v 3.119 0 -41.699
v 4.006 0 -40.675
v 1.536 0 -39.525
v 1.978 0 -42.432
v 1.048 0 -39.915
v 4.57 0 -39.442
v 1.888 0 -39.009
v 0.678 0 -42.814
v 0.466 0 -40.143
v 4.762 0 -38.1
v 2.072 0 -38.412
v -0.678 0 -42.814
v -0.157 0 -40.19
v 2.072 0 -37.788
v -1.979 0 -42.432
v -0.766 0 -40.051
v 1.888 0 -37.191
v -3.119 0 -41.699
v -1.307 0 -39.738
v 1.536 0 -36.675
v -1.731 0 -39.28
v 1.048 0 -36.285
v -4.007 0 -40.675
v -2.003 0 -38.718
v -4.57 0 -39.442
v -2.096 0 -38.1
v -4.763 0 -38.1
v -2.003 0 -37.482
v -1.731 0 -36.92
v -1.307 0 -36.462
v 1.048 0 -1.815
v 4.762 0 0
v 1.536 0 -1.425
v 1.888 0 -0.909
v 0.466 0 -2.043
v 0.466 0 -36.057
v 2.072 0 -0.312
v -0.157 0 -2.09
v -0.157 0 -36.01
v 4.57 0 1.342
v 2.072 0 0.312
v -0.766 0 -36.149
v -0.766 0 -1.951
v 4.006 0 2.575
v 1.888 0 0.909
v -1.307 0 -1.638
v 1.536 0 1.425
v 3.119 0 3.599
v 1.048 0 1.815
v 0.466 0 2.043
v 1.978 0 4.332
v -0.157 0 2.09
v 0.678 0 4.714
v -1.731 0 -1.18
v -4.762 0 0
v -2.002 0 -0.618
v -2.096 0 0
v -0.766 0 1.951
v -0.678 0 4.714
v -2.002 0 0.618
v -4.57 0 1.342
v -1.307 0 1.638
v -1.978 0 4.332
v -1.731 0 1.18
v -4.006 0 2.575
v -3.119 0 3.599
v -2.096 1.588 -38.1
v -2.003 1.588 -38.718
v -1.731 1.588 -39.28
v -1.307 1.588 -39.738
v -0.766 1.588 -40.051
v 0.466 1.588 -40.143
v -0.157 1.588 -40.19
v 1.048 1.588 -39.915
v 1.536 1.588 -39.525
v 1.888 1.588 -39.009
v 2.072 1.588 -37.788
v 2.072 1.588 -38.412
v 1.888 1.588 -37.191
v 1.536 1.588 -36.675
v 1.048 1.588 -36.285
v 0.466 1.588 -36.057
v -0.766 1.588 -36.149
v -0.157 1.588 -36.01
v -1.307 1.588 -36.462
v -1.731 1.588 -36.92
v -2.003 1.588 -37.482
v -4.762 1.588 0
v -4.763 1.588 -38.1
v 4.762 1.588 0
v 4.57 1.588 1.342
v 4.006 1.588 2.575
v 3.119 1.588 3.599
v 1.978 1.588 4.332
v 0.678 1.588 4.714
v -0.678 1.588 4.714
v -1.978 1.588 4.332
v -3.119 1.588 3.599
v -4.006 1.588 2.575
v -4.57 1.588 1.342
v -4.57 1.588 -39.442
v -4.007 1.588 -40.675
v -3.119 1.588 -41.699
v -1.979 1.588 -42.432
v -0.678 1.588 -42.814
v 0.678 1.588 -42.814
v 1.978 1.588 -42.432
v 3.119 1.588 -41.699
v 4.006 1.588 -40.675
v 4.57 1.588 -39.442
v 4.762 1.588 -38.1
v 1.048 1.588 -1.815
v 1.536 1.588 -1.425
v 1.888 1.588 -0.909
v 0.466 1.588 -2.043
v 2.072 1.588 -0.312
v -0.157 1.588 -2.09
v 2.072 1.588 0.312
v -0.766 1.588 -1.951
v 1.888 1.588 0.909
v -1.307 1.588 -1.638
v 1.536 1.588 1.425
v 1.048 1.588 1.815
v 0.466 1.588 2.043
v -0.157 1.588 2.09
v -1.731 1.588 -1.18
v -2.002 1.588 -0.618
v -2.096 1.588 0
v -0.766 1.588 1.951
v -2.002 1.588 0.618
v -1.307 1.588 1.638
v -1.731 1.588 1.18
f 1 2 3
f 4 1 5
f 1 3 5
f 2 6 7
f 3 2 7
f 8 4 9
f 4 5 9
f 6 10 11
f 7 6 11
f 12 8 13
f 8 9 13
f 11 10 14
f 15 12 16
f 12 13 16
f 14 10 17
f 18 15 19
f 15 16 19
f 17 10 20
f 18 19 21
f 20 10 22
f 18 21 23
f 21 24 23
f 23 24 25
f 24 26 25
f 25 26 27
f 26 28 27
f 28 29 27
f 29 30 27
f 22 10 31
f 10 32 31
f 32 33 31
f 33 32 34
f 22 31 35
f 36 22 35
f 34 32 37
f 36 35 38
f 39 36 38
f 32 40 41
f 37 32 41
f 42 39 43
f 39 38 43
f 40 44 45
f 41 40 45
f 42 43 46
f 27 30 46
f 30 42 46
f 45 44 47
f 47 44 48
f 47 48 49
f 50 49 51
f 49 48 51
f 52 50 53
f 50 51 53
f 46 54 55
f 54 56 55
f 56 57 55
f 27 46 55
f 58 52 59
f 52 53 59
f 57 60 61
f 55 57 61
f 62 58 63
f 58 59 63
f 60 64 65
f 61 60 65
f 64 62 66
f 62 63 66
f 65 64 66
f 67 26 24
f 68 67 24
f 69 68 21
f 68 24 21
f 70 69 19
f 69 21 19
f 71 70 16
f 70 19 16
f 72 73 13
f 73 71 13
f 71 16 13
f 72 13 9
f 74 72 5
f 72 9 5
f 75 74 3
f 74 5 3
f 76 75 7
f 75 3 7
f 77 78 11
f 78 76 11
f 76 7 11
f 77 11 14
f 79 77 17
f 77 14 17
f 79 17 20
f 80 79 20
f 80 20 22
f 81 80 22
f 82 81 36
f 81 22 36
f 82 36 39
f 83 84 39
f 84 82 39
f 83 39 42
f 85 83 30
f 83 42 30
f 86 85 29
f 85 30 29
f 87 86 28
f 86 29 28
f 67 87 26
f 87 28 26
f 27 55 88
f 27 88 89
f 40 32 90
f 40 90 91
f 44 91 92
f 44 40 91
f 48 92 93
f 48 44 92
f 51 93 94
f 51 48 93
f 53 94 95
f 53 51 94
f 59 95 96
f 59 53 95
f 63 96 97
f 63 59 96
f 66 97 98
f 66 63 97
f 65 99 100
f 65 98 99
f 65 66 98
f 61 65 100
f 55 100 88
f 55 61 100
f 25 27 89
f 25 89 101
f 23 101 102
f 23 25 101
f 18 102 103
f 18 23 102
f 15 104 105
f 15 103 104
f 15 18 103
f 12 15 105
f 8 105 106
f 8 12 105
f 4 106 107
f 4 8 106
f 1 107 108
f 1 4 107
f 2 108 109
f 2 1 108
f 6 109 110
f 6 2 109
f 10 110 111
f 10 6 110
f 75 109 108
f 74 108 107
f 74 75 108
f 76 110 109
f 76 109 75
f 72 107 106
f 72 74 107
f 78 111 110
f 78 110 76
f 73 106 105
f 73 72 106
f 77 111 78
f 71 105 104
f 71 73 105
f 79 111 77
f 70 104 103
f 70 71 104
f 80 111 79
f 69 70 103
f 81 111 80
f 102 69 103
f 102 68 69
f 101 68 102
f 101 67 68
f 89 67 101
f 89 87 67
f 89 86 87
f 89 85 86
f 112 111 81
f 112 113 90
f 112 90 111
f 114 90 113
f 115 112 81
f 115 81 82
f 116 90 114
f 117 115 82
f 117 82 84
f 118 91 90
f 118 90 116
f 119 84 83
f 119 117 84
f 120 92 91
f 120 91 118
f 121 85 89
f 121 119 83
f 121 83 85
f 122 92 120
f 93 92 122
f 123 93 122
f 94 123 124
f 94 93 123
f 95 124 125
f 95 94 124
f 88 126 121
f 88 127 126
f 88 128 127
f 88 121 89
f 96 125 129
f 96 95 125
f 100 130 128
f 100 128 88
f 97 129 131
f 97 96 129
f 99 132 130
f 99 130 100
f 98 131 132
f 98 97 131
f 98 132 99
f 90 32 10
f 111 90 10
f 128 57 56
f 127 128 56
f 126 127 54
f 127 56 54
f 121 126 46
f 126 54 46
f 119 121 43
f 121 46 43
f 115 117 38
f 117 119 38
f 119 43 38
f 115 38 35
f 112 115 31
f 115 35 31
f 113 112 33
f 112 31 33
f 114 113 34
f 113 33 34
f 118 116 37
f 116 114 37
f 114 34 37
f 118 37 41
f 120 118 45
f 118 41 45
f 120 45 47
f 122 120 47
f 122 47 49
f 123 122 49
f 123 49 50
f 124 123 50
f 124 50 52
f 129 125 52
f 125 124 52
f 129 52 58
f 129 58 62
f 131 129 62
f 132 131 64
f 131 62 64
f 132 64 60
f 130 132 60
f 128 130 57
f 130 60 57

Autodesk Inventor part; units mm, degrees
ref_plane "YZ Plane" through (0, 0, 0) normal (1, 0, 0) x (0, 1, 0)
ref_plane "XZ Plane" through (0, 0, 0) normal (0, 1, 0) x (-1, 0, 0)
ref_plane "XY Plane" through (0, 0, 0) normal (0, 0, 1) x (1, 0, 0)
sketch "Sketch2" plane through (0, 0, 0) normal (0, 1, 0) x (-1, 0, 0)
  circle A0 centre (0, 0) radius 2.0955
  arc A1 (-4.7625, 0) -> (-4.7625, 0) centre (0, 0) ccw
  circle A2 centre (0.0001, -38.1) radius 2.0955
  arc A3 (-4.7625, -38.1) -> (4.7628, -38.1) centre (0.0001, -38.1) ccw
  line L0 (4.7625, 0) -> (4.7628, -38.1)
  line L1 (-4.7625, 0) -> (-4.7625, -38.1)
  arc A4 (4.7625, 0) -> (-4.7625, 0) centre (0, 0) ccw
  dimension "d0" = 4.191
  dimension "d1" = 2.667
  dimension "d2" = 4.191
  dimension "d5" = 38.1
extrude "Extrusion1" add sketch "Sketch2" along normal blind 1.5875
properties part number "straight_gusset" material "Acetal Resin, White"
